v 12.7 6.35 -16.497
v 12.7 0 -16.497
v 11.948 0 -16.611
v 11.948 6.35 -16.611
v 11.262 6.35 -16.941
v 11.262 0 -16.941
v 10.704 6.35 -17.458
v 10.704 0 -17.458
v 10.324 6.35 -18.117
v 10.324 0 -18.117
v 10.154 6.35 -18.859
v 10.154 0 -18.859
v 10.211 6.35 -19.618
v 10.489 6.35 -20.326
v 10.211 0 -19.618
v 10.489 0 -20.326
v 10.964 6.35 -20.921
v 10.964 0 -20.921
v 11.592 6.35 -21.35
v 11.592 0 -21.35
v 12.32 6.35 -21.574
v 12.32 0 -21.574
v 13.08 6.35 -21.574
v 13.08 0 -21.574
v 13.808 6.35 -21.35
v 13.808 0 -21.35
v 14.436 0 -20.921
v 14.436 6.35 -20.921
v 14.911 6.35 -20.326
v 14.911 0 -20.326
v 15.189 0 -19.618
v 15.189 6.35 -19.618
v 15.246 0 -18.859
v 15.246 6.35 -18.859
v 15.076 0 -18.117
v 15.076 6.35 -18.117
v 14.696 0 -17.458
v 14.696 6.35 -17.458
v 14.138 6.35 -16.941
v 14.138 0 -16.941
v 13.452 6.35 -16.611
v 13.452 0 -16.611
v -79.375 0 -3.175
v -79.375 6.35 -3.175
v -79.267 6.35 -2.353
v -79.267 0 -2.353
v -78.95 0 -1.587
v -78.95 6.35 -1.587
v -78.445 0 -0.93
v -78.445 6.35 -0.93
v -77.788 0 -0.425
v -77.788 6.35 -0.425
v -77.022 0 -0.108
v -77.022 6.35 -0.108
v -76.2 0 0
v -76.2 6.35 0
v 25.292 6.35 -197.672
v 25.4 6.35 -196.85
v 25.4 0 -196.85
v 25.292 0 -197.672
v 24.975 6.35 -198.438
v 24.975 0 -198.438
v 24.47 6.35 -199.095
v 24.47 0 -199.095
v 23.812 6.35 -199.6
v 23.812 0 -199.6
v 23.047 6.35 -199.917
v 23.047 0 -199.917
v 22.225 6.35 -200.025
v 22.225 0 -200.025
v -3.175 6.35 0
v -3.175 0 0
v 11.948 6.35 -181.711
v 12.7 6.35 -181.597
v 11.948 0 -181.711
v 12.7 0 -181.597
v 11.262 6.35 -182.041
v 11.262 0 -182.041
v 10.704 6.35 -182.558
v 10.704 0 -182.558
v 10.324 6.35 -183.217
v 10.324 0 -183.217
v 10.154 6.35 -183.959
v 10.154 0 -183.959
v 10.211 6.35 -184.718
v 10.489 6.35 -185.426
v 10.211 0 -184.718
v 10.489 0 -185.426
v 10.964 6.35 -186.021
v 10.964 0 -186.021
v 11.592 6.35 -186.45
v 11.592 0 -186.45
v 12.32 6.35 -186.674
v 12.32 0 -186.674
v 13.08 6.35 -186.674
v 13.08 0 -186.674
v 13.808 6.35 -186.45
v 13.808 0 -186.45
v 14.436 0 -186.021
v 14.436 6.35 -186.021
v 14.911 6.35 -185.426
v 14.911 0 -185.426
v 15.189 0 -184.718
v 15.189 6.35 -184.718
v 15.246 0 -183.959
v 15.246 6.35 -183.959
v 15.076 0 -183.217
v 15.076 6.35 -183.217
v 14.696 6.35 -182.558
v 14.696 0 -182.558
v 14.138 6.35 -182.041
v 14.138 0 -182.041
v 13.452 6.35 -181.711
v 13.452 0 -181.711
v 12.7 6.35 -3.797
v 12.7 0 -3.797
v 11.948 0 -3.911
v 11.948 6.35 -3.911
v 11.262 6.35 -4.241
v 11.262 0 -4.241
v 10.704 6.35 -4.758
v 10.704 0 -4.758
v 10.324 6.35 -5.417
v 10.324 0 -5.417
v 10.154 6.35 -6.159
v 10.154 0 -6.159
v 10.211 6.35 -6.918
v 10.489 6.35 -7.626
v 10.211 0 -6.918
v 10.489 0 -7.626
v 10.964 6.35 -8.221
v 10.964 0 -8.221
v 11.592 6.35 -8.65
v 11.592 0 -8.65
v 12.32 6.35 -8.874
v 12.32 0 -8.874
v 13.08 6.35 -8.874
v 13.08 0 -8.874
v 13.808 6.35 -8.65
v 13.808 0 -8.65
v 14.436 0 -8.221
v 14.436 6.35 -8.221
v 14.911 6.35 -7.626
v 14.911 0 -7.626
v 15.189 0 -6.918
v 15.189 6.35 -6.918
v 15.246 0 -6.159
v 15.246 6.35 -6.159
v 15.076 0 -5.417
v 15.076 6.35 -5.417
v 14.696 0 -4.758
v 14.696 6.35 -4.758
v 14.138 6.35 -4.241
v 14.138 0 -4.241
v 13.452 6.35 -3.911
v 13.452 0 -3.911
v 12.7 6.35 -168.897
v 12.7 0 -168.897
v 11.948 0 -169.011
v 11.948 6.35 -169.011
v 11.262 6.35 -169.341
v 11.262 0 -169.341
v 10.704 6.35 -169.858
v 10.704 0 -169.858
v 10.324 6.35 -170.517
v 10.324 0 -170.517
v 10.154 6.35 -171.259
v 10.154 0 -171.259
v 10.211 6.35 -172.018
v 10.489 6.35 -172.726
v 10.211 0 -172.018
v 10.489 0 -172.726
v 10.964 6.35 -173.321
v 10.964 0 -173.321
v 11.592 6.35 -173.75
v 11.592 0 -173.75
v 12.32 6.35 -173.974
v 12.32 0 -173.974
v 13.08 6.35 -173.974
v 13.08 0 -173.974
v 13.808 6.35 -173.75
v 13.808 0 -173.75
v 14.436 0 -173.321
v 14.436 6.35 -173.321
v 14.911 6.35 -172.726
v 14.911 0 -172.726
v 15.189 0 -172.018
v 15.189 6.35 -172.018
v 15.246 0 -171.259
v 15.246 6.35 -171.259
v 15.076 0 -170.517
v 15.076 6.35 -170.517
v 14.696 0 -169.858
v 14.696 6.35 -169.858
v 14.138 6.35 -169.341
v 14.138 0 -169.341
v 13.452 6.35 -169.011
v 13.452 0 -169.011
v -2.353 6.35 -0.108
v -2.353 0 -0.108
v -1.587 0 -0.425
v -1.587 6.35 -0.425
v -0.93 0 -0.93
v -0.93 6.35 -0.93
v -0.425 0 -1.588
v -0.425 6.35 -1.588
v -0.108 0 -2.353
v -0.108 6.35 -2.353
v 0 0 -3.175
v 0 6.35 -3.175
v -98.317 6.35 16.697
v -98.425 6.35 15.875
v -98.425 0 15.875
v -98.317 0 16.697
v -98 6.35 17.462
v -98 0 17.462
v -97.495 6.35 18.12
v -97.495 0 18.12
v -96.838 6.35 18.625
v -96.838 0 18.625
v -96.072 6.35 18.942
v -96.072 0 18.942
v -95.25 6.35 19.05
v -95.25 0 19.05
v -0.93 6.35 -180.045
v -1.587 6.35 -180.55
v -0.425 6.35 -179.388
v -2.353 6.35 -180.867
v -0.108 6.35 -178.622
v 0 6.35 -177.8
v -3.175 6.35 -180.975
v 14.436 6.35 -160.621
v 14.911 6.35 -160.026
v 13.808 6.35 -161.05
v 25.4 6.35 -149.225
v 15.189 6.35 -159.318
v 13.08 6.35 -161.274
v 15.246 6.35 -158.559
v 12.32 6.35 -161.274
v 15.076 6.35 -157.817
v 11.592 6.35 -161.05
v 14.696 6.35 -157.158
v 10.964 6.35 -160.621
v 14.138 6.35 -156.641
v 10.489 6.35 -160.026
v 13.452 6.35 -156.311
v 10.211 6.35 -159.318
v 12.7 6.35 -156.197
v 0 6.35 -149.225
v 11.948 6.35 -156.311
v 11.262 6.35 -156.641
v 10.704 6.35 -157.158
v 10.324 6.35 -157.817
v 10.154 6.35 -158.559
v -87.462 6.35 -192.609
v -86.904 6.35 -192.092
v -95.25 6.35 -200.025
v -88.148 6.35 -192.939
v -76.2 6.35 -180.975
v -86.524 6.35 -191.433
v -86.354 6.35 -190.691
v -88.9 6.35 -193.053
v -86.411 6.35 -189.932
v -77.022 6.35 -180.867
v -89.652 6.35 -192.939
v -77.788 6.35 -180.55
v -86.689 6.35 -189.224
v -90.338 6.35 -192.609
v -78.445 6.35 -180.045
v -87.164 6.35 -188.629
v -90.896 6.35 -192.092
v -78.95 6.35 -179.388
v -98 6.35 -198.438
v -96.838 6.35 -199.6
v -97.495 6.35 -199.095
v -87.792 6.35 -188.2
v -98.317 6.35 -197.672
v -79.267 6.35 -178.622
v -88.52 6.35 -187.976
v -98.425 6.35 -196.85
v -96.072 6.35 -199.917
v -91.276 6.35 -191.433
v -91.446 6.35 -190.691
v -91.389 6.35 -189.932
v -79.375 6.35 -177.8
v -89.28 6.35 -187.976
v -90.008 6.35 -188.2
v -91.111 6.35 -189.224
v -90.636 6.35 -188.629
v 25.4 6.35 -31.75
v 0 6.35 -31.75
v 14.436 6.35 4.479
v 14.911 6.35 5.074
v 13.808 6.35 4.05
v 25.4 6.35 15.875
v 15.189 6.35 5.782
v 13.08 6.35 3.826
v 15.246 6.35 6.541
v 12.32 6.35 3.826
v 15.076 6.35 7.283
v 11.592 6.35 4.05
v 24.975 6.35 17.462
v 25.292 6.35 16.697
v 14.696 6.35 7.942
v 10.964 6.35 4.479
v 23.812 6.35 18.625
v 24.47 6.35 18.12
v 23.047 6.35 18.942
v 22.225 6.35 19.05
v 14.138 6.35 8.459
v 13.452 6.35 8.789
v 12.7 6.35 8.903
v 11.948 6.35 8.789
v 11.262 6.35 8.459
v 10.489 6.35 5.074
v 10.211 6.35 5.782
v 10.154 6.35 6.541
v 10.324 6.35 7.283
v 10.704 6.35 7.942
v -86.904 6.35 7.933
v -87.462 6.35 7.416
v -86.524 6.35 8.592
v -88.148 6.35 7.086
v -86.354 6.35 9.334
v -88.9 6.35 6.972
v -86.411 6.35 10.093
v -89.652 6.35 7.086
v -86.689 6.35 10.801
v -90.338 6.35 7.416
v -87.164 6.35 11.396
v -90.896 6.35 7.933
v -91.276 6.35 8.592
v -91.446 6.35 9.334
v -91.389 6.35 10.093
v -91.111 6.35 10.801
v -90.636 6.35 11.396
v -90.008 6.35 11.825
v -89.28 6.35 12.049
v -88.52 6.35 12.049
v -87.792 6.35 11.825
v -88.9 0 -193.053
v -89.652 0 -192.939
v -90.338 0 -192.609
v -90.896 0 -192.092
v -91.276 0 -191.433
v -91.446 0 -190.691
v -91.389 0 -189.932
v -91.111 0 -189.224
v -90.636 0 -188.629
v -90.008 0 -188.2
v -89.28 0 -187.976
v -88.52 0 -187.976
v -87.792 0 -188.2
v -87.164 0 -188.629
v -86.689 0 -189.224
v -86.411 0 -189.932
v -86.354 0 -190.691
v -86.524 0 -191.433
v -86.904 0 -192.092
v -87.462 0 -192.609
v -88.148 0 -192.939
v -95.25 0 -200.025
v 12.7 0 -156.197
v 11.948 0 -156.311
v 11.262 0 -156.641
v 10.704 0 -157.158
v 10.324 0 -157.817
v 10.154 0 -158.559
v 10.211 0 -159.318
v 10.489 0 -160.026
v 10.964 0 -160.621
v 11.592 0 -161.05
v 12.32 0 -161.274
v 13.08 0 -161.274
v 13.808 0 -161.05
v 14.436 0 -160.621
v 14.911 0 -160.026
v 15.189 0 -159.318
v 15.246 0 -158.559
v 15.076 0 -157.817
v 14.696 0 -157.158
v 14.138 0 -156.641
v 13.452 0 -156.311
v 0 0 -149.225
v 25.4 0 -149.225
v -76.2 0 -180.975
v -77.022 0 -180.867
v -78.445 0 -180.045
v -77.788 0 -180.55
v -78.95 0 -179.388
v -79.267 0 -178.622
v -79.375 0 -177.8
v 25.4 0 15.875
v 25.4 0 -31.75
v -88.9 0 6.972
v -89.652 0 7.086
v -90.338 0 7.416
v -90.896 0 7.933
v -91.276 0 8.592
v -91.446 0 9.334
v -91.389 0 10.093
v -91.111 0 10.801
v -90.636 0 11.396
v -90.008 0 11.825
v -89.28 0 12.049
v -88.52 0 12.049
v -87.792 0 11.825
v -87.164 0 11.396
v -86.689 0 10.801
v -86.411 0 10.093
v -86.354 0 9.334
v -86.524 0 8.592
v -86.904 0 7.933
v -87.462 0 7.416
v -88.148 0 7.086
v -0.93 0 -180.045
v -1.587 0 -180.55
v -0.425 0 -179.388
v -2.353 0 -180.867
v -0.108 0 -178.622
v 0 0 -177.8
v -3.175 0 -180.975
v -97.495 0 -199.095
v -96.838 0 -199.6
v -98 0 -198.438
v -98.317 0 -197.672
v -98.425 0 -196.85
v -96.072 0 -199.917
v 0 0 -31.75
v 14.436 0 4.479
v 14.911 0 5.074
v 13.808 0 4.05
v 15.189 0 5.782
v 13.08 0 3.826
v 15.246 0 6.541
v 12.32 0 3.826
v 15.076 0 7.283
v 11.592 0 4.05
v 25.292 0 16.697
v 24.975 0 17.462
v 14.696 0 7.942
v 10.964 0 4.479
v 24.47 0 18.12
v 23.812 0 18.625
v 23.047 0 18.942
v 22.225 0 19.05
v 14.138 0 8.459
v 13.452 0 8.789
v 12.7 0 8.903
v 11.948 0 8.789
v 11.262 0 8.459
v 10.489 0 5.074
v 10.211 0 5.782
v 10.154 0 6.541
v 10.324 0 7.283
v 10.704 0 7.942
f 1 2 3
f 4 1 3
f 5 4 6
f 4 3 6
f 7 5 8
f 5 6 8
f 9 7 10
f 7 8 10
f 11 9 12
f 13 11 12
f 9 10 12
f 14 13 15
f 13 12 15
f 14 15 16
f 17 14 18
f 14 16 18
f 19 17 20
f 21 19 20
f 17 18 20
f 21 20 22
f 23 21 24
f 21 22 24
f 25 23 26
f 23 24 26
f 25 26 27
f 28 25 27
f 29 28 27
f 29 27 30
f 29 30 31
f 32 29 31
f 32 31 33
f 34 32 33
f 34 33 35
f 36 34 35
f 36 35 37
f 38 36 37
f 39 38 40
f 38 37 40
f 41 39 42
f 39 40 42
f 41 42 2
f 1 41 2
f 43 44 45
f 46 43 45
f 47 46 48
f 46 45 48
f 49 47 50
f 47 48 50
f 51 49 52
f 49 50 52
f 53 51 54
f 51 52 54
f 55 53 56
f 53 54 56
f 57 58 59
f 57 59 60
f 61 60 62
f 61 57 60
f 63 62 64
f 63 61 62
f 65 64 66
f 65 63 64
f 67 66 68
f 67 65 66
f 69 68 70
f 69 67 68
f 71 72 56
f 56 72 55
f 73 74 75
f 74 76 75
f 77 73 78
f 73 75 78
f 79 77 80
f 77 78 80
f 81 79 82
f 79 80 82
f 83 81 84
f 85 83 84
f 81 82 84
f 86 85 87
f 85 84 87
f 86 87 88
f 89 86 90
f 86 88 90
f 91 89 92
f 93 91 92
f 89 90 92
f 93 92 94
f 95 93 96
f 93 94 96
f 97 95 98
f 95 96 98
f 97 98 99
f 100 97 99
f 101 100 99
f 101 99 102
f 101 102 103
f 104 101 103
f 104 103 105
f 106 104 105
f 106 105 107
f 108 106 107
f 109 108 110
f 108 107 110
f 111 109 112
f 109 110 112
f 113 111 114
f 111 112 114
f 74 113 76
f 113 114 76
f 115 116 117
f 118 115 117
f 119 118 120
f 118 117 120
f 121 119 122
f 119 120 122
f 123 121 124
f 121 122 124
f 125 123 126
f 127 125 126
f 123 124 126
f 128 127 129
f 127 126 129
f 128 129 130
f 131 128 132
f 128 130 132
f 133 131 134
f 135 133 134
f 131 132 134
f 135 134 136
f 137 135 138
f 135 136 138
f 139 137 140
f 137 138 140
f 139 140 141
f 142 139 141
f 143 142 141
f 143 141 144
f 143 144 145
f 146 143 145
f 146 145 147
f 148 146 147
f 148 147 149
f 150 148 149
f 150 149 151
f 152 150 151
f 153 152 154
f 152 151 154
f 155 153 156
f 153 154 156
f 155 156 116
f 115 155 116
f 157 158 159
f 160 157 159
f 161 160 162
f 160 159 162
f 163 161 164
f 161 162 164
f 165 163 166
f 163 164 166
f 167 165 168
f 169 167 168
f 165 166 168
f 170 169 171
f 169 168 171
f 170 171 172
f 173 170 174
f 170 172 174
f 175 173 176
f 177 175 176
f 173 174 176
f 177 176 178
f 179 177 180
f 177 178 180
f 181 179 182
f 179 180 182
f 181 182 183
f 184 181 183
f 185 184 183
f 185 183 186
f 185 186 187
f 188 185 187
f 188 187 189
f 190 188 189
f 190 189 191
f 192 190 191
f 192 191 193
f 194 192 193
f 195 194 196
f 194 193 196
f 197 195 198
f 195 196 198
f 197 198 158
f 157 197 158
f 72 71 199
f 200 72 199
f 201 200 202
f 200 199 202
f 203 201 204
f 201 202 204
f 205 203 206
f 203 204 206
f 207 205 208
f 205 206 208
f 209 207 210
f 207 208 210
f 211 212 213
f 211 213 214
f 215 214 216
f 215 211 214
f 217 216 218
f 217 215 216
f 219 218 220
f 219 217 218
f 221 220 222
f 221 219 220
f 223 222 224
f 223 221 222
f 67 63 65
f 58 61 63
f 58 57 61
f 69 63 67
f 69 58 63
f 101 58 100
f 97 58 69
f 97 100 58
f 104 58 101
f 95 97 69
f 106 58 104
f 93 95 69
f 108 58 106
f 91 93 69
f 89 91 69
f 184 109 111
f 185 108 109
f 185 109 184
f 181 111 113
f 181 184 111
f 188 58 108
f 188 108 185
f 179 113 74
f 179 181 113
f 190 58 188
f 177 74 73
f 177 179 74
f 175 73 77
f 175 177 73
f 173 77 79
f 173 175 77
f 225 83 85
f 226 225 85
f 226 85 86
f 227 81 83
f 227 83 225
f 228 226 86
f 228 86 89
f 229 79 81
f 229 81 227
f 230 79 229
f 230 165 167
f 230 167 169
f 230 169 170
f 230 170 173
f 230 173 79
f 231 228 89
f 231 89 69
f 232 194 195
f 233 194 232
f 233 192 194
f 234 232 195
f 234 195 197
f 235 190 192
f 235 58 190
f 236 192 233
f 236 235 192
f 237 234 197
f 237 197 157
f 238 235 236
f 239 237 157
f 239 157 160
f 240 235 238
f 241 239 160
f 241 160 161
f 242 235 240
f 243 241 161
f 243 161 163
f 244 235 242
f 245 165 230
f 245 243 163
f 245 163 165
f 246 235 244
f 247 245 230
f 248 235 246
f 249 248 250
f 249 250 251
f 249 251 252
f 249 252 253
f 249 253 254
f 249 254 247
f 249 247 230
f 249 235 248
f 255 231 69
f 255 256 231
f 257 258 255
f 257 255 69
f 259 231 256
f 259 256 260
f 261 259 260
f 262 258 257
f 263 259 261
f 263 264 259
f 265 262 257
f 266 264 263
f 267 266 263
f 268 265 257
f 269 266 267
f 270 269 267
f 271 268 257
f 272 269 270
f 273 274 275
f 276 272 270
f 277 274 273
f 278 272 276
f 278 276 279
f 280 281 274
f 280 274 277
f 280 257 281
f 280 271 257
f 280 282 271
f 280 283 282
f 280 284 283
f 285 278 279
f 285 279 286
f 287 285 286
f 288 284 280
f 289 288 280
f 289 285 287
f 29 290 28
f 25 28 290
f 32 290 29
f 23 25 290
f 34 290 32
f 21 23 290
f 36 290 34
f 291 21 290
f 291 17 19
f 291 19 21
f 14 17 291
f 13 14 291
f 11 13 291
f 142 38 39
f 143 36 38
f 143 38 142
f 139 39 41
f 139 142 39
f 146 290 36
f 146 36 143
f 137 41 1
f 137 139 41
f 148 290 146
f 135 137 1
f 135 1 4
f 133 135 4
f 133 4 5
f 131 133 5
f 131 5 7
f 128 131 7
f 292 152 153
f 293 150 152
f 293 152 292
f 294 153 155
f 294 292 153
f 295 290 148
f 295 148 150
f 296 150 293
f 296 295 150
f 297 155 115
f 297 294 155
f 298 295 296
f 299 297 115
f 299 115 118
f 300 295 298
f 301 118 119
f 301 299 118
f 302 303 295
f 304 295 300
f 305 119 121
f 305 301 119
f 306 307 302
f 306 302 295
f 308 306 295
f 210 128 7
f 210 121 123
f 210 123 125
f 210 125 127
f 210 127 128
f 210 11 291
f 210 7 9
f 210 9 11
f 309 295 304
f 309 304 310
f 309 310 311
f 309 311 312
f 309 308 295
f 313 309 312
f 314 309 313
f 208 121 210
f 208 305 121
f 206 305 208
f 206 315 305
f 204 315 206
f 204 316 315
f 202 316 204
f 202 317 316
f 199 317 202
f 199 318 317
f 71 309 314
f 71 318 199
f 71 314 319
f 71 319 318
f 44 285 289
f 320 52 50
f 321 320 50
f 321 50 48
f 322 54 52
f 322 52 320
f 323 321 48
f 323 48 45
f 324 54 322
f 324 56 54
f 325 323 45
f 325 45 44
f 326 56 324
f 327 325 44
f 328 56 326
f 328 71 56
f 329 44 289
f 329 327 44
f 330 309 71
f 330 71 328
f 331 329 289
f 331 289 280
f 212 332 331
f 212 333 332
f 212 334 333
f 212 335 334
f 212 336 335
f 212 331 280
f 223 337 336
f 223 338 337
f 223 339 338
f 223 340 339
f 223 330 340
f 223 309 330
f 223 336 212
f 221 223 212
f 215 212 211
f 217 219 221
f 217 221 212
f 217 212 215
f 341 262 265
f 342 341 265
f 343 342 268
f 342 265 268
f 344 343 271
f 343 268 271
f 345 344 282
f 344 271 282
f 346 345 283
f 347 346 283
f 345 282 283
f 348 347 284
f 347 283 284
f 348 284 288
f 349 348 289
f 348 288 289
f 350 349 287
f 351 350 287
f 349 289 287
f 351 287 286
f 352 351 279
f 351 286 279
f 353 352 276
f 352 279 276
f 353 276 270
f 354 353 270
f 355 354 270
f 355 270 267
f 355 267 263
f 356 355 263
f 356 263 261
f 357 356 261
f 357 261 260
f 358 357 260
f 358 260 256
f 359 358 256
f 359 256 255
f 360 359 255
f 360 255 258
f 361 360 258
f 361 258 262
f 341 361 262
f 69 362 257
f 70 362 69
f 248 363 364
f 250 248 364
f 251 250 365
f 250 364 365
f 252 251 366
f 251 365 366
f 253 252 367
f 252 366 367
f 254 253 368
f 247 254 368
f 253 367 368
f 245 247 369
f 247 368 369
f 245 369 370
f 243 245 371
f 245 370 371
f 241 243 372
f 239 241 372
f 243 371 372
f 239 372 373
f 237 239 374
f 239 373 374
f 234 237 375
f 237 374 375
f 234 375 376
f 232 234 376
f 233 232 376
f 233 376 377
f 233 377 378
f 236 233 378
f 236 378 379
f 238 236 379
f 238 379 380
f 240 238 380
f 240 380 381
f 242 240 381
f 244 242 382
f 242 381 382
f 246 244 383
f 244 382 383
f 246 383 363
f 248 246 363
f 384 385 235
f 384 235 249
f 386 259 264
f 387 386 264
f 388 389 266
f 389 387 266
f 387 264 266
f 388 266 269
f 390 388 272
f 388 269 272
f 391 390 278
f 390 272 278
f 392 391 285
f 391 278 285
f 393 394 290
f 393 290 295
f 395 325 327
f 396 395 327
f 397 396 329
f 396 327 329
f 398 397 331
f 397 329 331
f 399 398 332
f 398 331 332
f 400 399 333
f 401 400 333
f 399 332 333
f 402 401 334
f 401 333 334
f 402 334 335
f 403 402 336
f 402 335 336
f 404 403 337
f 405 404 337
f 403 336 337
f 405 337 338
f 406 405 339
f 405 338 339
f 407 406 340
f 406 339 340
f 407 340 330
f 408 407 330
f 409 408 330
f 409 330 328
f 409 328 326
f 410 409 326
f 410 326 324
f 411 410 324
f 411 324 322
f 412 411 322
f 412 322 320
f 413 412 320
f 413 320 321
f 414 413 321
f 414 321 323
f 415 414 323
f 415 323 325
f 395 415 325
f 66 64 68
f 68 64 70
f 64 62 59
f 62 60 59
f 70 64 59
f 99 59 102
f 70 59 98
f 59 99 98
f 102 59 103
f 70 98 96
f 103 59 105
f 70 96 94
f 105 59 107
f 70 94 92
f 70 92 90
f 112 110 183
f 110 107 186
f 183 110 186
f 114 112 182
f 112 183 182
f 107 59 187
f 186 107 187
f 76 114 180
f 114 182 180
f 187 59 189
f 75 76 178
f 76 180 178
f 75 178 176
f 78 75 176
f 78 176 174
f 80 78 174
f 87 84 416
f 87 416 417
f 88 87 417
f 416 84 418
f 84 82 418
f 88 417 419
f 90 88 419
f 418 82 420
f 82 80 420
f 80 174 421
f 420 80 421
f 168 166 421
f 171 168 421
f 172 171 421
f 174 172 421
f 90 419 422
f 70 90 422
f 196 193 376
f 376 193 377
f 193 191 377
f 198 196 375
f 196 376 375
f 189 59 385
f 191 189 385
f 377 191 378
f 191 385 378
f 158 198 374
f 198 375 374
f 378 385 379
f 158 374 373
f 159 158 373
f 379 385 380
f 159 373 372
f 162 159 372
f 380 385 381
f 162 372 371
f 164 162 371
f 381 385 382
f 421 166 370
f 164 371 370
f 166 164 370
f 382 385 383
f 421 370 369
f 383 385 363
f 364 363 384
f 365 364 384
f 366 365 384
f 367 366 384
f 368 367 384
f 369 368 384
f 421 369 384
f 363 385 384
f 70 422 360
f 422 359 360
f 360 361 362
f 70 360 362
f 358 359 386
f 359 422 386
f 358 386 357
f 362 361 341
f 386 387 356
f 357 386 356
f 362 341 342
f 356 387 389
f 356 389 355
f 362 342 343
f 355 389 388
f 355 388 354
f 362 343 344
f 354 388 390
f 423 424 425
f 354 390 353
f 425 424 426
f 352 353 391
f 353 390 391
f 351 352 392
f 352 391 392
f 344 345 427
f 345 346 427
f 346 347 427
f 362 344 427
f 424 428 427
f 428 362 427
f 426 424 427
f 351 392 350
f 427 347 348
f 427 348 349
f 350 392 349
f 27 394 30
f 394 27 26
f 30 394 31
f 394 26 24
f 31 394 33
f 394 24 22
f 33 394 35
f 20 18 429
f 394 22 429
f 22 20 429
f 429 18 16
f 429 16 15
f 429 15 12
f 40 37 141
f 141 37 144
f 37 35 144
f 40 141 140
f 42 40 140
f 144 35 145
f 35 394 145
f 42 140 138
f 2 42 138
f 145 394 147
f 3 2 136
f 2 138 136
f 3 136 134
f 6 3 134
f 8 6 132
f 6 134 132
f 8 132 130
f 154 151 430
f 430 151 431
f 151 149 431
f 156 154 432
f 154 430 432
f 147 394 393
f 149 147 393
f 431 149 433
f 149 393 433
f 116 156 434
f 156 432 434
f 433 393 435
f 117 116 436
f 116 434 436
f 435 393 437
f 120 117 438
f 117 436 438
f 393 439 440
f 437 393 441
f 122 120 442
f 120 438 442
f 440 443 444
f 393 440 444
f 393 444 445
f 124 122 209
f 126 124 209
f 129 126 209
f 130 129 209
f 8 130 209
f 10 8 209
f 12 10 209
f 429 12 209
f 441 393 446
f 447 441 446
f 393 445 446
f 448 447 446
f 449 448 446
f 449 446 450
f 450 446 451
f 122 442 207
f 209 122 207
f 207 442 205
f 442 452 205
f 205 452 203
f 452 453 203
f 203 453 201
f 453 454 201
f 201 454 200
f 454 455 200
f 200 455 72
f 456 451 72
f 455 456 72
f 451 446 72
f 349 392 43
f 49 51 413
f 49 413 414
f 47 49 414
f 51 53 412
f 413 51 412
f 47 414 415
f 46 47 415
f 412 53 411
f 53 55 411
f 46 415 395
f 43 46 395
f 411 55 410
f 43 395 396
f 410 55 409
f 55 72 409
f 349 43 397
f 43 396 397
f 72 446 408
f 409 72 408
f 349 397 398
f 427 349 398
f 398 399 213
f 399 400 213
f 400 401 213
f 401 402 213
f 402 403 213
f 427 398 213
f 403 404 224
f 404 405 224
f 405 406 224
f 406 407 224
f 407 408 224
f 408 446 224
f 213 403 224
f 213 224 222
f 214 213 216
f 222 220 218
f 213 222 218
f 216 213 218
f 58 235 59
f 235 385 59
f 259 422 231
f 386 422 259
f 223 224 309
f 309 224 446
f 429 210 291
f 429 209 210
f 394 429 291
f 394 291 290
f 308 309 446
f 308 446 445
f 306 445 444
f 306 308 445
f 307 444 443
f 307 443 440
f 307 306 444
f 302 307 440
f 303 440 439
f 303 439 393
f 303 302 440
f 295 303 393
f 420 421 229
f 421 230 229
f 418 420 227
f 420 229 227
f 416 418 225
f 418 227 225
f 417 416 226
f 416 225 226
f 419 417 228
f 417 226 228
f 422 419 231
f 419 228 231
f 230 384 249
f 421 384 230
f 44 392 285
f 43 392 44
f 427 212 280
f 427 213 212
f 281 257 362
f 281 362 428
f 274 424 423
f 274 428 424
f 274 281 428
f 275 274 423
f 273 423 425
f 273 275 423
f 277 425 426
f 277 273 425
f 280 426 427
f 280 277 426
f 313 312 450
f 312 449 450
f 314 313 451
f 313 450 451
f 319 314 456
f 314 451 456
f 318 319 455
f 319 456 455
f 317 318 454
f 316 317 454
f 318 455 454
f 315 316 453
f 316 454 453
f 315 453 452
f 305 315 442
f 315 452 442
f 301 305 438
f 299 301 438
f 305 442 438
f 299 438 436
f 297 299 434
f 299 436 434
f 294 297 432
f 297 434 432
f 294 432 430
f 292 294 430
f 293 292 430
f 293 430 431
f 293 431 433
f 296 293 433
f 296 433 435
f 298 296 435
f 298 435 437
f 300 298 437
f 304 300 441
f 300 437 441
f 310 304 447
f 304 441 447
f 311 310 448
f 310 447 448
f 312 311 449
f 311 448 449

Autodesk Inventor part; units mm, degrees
ref_plane "YZ Plane" through (0, 0, 0) normal (1, 0, 0) x (0, 1, 0)
ref_plane "XZ Plane" through (0, 0, 0) normal (0, 1, 0) x (-1, 0, 0)
ref_plane "XY Plane" through (0, 0, 0) normal (0, 0, 1) x (1, 0, 0)
sketch "Sketch1" plane through (0, 0, 0) normal (0, 1, 0) x (-1, 0, 0)
  line L0 (0, 0) -> (79.375, 0)
  line L1 (79.375, 0) -> (79.375, 19.05) construction
  line L2 (79.375, 19.05) -> (0, 19.05)
  line L3 (0, 19.05) -> (0, 0) construction
  line L4 (79.375, 19.05) -> (98.425, 19.05)
  line L5 (98.425, 19.05) -> (98.425, -200.025)
  line L6 (98.425, -200.025) -> (79.375, -200.025)
  line L7 (79.375, -200.025) -> (79.375, 19.05)
  line L8 (79.375, -200.025) -> (0, -200.025)
  line L9 (0, -200.025) -> (0, -180.975) construction
  line L10 (0, -180.975) -> (79.375, -180.975)
  line L11 (79.375, -180.975) -> (79.375, -200.025) construction
  line L12 (0, 0) -> (-25.4, 0) construction
  line L13 (-25.4, 0) -> (-25.4, 19.05)
  line L14 (-25.4, 19.05) -> (0, 19.05)
  line L15 (0, 19.05) -> (0, 0)
  line L16 (0, -180.975) -> (-25.4, -180.975) construction
  line L17 (-25.4, -180.975) -> (-25.4, -200.025)
  line L18 (-25.4, -200.025) -> (0, -200.025)
  line L19 (0, -200.025) -> (0, -180.975) construction
  circle A0 centre (-12.7, 6.35) radius 2.54 construction
  circle A1 centre (-12.7, -187.325) radius 2.54 construction
  circle A2 centre (88.9, -190.5) radius 2.54 construction
  circle A3 centre (88.9, 9.525) radius 2.54 construction
  line L20 (0, -180.975) -> (-25.4, -180.975) construction
  line L21 (-25.4, -180.975) -> (-25.4, -149.225)
  line L22 (-25.4, -149.225) -> (0, -149.225)
  line L23 (0, -149.225) -> (0, -180.975)
  line L24 (0, -180.975) -> (-25.4, -149.225) construction
  line L25 (-25.4, -180.975) -> (0, -149.225) construction
  line L26 (0, -31.75) -> (-25.4, -31.75)
  line L27 (-25.4, -31.75) -> (-25.4, 0)
  line L28 (-25.4, 0) -> (0, 0) construction
  line L29 (0, 0) -> (0, -31.75)
  line L30 (0, -31.75) -> (-25.4, 0) construction
  line L31 (-25.4, -31.75) -> (0, 0) construction
  point P0 (79.375, 0)
  point P1 (79.375, -180.975)
  point P2 (0, -200.025)
  point P3 (79.375, -190.5)
  point P4 (0, -200.025)
  point P5 (-12.7, -165.1)
  point P6 (-12.7, -15.875)
  dimension "d0" = 79.375
  dimension "d1" = 19.05
  dimension "d3" = 19.05
  dimension "d4" = 79.375
  dimension "d5" = 19.05
  dimension "d8" = 180.975
  dimension "d9" = 25.4
  dimension "d10" = 19.05
  dimension "d11" = 25.4
  dimension "d12" = 19.05
  dimension "d17" = 5.08
  dimension "d18" = 6.35
  dimension "d20" = 5.08
  dimension "d21" = 12.7
  dimension "d23" = 12.7
  dimension "d38" = 5.08
  dimension "d39" = 9.525
  dimension "d40" = 9.525
  dimension "d41" = 5.08
  dimension "d42" = 9.525
  dimension "d43" = 9.525
  dimension "d52" = 12.7
  dimension "d53" = 25.4
  dimension "d54" = 50.8
  dimension "d55" = 50.8
  dimension "d56" = 25.4
extrude "Extrusion1" add sketch "Sketch1" along normal blind 6.35
hole "Hole3" at (-88.9, 0, -190.5) at (-88.9, 0, 9.525) direction (0, 1, 0) diameter 5.1054 end through all clearance for "Flat Head Machine Screw (82)" size "#10" standard "Ansi Unified Screw Threads"
fillet "Fillet1" radius 3.175 8 edges at (-98.425, 3.175, -200.025) (25.4, 3.175, -200.025) (-79.375, 3.175, -180.975) (-79.375, 3.175, 0) (-98.425, 3.175, 19.05) (25.4, 3.175, 19.05) (0, 3.175, 0) (0, 3.175, -180.975)
sketch "Sketch3" plane through (0, 6.35, 0) normal (0, 1, 0) x (1, 0, 0)
  line L0 (-95.25, -19.05) -> (22.225, -19.05) construction
  line L1 (25.4, -15.875) -> (25.4, 31.75) construction
  point P0 (0, 0)
  point P1 (12.7, -6.35)
  point P2 (12.7, 6.35)
  point P3 (12.7, 19.05)
  point P4 (12.7, 31.75)
  point P5 (12.7, 44.45)
  point P6 (12.7, 57.15)
  point P7 (12.7, 69.85)
  point P8 (12.7, 82.55)
  point P9 (12.7, 95.25)
  point P10 (12.7, 107.95)
  point P11 (12.7, 120.65)
  point P12 (12.7, 133.35)
  point P13 (12.7, 146.05)
  point P14 (12.7, 158.75)
  point P15 (12.7, 171.45)
  point P16 (12.7, 184.15)
  dimension "d57" = 12.7
  dimension "d58" = 12.7
  dimension "d61" = 12.7
hole "Hole4" at (12.7, 6.35, 6.35) at (12.7, 6.35, -6.35) at (12.7, 6.35, -19.05) at (12.7, 6.35, -44.45) at (12.7, 6.35, -57.15) at (12.7, 6.35, -69.85) at (12.7, 6.35, -82.55) at (12.7, 6.35, -95.25) at (12.7, 6.35, -107.95) at (12.7, 6.35, -120.65) at (12.7, 6.35, -133.35) at (12.7, 6.35, -146.05) at (12.7, 6.35, -158.75) at (12.7, 6.35, -171.45) at (12.7, 6.35, -184.15) direction (0, -1, 0) diameter 5.1054 end through all clearance for "Flat Head Machine Screw (82)" size "#10" standard "Ansi Unified Screw Threads"
equation "\"d4\" = d0"
properties part number "DB1-009" material "Aluminum 6061"
